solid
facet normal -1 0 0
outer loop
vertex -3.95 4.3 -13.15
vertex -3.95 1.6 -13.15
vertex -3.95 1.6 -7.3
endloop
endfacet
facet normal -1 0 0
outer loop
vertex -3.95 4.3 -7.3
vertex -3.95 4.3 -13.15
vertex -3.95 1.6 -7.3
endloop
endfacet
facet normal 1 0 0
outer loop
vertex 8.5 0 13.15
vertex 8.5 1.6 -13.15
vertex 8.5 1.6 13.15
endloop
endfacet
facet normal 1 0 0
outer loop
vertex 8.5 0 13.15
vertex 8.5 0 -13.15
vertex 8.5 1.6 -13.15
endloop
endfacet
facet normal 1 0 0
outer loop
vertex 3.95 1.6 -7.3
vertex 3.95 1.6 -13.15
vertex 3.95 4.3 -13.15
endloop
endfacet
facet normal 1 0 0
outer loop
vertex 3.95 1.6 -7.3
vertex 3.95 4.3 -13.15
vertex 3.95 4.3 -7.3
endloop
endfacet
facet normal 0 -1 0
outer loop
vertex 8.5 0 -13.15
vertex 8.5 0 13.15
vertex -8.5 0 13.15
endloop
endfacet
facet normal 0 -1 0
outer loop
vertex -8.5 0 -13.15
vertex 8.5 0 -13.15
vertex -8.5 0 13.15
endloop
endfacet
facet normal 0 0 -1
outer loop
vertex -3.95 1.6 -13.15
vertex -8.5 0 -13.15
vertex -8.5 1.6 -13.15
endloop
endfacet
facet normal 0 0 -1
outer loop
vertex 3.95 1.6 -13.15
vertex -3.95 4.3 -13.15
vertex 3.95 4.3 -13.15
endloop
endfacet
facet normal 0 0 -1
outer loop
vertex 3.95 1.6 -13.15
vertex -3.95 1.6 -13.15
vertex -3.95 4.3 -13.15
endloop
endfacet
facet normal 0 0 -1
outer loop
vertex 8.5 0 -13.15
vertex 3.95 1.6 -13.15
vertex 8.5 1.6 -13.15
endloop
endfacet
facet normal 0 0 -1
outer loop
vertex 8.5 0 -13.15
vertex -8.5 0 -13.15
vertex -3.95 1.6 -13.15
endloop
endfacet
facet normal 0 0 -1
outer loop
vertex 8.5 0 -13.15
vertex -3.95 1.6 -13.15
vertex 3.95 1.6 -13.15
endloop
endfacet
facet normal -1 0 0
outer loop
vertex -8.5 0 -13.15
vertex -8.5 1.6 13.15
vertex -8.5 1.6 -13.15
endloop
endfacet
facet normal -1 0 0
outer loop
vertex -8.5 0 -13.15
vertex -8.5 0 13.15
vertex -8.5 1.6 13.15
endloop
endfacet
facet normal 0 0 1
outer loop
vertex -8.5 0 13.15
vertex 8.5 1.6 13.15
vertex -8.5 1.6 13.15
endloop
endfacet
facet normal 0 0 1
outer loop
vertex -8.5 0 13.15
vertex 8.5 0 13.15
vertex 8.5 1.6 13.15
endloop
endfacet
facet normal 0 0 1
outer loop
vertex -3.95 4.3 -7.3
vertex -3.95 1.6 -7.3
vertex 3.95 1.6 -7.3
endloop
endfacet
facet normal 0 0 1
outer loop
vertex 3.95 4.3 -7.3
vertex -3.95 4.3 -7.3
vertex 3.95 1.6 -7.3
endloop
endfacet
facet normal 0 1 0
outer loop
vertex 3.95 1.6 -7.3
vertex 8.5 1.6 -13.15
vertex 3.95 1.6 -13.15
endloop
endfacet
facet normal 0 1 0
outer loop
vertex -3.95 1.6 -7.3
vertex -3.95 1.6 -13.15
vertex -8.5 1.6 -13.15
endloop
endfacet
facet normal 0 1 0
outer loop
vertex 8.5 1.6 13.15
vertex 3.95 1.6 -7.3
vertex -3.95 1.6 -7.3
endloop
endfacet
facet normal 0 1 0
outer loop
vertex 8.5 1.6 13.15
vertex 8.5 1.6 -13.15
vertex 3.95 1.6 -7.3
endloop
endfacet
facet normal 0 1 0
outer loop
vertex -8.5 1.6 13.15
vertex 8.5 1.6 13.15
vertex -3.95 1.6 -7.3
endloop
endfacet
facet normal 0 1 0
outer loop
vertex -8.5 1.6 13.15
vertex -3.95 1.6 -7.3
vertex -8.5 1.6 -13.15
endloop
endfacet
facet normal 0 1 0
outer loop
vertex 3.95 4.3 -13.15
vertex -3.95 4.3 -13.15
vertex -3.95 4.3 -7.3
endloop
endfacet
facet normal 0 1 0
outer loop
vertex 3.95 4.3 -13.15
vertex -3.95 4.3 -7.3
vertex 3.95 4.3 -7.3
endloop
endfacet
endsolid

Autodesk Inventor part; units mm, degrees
ref_plane "XZ Plane" through (0, 0, 0) normal (0, 1, 0) x (-1, 0, 0)
ref_plane "XY Plane" through (0, 0, 0) normal (0, 0, 1) x (1, 0, 0)
sketch "Sketch1" plane through (0, 0, 0) normal (0, 1, 0) x (-1, 0, 0)
  line L0 (-8.5, 13.15) -> (8.5, 13.15)
  line L1 (8.5, 13.15) -> (8.5, -13.15)
  line L2 (8.5, -13.15) -> (-8.5, -13.15)
  line L3 (-8.5, -13.15) -> (-8.5, 13.15)
  line L4 (-8.5, 13.15) -> (8.5, -13.15) construction
  line L5 (8.5, 13.15) -> (-8.5, -13.15) construction
  point P0 (0, 0)
  dimension "d0" = 17
  dimension "d1" = 26.3
extrude "Extrusion1" add sketch "Sketch1" along normal blind 1.6
sketch "Sketch3" plane through (0, 1.6, 0) normal (0, 1, 0) x (1, 0, 0)
  line L0 (8.5, 13.15) -> (-8.5, 13.15) construction
  line L1 (0, 13.15) -> (0, 0) construction
  line L2 (-3.95, 13.15) -> (-3.95, 7.3)
  line L3 (-3.95, 7.3) -> (0, 7.3)
  line L4 (-3.95, 13.15) -> (0, 13.15)
  line L5 (3.95, 13.15) -> (3.95, 7.3)
  line L6 (3.95, 7.3) -> (0, 7.3)
  line L7 (3.95, 13.15) -> (0, 13.15)
  dimension "d5" = 5.85
  dimension "d6" = 3.95
extrude "Extrusion2" add sketch "Sketch3" along normal blind 2.7
properties part number "Wavgat_Battery_Charger"
